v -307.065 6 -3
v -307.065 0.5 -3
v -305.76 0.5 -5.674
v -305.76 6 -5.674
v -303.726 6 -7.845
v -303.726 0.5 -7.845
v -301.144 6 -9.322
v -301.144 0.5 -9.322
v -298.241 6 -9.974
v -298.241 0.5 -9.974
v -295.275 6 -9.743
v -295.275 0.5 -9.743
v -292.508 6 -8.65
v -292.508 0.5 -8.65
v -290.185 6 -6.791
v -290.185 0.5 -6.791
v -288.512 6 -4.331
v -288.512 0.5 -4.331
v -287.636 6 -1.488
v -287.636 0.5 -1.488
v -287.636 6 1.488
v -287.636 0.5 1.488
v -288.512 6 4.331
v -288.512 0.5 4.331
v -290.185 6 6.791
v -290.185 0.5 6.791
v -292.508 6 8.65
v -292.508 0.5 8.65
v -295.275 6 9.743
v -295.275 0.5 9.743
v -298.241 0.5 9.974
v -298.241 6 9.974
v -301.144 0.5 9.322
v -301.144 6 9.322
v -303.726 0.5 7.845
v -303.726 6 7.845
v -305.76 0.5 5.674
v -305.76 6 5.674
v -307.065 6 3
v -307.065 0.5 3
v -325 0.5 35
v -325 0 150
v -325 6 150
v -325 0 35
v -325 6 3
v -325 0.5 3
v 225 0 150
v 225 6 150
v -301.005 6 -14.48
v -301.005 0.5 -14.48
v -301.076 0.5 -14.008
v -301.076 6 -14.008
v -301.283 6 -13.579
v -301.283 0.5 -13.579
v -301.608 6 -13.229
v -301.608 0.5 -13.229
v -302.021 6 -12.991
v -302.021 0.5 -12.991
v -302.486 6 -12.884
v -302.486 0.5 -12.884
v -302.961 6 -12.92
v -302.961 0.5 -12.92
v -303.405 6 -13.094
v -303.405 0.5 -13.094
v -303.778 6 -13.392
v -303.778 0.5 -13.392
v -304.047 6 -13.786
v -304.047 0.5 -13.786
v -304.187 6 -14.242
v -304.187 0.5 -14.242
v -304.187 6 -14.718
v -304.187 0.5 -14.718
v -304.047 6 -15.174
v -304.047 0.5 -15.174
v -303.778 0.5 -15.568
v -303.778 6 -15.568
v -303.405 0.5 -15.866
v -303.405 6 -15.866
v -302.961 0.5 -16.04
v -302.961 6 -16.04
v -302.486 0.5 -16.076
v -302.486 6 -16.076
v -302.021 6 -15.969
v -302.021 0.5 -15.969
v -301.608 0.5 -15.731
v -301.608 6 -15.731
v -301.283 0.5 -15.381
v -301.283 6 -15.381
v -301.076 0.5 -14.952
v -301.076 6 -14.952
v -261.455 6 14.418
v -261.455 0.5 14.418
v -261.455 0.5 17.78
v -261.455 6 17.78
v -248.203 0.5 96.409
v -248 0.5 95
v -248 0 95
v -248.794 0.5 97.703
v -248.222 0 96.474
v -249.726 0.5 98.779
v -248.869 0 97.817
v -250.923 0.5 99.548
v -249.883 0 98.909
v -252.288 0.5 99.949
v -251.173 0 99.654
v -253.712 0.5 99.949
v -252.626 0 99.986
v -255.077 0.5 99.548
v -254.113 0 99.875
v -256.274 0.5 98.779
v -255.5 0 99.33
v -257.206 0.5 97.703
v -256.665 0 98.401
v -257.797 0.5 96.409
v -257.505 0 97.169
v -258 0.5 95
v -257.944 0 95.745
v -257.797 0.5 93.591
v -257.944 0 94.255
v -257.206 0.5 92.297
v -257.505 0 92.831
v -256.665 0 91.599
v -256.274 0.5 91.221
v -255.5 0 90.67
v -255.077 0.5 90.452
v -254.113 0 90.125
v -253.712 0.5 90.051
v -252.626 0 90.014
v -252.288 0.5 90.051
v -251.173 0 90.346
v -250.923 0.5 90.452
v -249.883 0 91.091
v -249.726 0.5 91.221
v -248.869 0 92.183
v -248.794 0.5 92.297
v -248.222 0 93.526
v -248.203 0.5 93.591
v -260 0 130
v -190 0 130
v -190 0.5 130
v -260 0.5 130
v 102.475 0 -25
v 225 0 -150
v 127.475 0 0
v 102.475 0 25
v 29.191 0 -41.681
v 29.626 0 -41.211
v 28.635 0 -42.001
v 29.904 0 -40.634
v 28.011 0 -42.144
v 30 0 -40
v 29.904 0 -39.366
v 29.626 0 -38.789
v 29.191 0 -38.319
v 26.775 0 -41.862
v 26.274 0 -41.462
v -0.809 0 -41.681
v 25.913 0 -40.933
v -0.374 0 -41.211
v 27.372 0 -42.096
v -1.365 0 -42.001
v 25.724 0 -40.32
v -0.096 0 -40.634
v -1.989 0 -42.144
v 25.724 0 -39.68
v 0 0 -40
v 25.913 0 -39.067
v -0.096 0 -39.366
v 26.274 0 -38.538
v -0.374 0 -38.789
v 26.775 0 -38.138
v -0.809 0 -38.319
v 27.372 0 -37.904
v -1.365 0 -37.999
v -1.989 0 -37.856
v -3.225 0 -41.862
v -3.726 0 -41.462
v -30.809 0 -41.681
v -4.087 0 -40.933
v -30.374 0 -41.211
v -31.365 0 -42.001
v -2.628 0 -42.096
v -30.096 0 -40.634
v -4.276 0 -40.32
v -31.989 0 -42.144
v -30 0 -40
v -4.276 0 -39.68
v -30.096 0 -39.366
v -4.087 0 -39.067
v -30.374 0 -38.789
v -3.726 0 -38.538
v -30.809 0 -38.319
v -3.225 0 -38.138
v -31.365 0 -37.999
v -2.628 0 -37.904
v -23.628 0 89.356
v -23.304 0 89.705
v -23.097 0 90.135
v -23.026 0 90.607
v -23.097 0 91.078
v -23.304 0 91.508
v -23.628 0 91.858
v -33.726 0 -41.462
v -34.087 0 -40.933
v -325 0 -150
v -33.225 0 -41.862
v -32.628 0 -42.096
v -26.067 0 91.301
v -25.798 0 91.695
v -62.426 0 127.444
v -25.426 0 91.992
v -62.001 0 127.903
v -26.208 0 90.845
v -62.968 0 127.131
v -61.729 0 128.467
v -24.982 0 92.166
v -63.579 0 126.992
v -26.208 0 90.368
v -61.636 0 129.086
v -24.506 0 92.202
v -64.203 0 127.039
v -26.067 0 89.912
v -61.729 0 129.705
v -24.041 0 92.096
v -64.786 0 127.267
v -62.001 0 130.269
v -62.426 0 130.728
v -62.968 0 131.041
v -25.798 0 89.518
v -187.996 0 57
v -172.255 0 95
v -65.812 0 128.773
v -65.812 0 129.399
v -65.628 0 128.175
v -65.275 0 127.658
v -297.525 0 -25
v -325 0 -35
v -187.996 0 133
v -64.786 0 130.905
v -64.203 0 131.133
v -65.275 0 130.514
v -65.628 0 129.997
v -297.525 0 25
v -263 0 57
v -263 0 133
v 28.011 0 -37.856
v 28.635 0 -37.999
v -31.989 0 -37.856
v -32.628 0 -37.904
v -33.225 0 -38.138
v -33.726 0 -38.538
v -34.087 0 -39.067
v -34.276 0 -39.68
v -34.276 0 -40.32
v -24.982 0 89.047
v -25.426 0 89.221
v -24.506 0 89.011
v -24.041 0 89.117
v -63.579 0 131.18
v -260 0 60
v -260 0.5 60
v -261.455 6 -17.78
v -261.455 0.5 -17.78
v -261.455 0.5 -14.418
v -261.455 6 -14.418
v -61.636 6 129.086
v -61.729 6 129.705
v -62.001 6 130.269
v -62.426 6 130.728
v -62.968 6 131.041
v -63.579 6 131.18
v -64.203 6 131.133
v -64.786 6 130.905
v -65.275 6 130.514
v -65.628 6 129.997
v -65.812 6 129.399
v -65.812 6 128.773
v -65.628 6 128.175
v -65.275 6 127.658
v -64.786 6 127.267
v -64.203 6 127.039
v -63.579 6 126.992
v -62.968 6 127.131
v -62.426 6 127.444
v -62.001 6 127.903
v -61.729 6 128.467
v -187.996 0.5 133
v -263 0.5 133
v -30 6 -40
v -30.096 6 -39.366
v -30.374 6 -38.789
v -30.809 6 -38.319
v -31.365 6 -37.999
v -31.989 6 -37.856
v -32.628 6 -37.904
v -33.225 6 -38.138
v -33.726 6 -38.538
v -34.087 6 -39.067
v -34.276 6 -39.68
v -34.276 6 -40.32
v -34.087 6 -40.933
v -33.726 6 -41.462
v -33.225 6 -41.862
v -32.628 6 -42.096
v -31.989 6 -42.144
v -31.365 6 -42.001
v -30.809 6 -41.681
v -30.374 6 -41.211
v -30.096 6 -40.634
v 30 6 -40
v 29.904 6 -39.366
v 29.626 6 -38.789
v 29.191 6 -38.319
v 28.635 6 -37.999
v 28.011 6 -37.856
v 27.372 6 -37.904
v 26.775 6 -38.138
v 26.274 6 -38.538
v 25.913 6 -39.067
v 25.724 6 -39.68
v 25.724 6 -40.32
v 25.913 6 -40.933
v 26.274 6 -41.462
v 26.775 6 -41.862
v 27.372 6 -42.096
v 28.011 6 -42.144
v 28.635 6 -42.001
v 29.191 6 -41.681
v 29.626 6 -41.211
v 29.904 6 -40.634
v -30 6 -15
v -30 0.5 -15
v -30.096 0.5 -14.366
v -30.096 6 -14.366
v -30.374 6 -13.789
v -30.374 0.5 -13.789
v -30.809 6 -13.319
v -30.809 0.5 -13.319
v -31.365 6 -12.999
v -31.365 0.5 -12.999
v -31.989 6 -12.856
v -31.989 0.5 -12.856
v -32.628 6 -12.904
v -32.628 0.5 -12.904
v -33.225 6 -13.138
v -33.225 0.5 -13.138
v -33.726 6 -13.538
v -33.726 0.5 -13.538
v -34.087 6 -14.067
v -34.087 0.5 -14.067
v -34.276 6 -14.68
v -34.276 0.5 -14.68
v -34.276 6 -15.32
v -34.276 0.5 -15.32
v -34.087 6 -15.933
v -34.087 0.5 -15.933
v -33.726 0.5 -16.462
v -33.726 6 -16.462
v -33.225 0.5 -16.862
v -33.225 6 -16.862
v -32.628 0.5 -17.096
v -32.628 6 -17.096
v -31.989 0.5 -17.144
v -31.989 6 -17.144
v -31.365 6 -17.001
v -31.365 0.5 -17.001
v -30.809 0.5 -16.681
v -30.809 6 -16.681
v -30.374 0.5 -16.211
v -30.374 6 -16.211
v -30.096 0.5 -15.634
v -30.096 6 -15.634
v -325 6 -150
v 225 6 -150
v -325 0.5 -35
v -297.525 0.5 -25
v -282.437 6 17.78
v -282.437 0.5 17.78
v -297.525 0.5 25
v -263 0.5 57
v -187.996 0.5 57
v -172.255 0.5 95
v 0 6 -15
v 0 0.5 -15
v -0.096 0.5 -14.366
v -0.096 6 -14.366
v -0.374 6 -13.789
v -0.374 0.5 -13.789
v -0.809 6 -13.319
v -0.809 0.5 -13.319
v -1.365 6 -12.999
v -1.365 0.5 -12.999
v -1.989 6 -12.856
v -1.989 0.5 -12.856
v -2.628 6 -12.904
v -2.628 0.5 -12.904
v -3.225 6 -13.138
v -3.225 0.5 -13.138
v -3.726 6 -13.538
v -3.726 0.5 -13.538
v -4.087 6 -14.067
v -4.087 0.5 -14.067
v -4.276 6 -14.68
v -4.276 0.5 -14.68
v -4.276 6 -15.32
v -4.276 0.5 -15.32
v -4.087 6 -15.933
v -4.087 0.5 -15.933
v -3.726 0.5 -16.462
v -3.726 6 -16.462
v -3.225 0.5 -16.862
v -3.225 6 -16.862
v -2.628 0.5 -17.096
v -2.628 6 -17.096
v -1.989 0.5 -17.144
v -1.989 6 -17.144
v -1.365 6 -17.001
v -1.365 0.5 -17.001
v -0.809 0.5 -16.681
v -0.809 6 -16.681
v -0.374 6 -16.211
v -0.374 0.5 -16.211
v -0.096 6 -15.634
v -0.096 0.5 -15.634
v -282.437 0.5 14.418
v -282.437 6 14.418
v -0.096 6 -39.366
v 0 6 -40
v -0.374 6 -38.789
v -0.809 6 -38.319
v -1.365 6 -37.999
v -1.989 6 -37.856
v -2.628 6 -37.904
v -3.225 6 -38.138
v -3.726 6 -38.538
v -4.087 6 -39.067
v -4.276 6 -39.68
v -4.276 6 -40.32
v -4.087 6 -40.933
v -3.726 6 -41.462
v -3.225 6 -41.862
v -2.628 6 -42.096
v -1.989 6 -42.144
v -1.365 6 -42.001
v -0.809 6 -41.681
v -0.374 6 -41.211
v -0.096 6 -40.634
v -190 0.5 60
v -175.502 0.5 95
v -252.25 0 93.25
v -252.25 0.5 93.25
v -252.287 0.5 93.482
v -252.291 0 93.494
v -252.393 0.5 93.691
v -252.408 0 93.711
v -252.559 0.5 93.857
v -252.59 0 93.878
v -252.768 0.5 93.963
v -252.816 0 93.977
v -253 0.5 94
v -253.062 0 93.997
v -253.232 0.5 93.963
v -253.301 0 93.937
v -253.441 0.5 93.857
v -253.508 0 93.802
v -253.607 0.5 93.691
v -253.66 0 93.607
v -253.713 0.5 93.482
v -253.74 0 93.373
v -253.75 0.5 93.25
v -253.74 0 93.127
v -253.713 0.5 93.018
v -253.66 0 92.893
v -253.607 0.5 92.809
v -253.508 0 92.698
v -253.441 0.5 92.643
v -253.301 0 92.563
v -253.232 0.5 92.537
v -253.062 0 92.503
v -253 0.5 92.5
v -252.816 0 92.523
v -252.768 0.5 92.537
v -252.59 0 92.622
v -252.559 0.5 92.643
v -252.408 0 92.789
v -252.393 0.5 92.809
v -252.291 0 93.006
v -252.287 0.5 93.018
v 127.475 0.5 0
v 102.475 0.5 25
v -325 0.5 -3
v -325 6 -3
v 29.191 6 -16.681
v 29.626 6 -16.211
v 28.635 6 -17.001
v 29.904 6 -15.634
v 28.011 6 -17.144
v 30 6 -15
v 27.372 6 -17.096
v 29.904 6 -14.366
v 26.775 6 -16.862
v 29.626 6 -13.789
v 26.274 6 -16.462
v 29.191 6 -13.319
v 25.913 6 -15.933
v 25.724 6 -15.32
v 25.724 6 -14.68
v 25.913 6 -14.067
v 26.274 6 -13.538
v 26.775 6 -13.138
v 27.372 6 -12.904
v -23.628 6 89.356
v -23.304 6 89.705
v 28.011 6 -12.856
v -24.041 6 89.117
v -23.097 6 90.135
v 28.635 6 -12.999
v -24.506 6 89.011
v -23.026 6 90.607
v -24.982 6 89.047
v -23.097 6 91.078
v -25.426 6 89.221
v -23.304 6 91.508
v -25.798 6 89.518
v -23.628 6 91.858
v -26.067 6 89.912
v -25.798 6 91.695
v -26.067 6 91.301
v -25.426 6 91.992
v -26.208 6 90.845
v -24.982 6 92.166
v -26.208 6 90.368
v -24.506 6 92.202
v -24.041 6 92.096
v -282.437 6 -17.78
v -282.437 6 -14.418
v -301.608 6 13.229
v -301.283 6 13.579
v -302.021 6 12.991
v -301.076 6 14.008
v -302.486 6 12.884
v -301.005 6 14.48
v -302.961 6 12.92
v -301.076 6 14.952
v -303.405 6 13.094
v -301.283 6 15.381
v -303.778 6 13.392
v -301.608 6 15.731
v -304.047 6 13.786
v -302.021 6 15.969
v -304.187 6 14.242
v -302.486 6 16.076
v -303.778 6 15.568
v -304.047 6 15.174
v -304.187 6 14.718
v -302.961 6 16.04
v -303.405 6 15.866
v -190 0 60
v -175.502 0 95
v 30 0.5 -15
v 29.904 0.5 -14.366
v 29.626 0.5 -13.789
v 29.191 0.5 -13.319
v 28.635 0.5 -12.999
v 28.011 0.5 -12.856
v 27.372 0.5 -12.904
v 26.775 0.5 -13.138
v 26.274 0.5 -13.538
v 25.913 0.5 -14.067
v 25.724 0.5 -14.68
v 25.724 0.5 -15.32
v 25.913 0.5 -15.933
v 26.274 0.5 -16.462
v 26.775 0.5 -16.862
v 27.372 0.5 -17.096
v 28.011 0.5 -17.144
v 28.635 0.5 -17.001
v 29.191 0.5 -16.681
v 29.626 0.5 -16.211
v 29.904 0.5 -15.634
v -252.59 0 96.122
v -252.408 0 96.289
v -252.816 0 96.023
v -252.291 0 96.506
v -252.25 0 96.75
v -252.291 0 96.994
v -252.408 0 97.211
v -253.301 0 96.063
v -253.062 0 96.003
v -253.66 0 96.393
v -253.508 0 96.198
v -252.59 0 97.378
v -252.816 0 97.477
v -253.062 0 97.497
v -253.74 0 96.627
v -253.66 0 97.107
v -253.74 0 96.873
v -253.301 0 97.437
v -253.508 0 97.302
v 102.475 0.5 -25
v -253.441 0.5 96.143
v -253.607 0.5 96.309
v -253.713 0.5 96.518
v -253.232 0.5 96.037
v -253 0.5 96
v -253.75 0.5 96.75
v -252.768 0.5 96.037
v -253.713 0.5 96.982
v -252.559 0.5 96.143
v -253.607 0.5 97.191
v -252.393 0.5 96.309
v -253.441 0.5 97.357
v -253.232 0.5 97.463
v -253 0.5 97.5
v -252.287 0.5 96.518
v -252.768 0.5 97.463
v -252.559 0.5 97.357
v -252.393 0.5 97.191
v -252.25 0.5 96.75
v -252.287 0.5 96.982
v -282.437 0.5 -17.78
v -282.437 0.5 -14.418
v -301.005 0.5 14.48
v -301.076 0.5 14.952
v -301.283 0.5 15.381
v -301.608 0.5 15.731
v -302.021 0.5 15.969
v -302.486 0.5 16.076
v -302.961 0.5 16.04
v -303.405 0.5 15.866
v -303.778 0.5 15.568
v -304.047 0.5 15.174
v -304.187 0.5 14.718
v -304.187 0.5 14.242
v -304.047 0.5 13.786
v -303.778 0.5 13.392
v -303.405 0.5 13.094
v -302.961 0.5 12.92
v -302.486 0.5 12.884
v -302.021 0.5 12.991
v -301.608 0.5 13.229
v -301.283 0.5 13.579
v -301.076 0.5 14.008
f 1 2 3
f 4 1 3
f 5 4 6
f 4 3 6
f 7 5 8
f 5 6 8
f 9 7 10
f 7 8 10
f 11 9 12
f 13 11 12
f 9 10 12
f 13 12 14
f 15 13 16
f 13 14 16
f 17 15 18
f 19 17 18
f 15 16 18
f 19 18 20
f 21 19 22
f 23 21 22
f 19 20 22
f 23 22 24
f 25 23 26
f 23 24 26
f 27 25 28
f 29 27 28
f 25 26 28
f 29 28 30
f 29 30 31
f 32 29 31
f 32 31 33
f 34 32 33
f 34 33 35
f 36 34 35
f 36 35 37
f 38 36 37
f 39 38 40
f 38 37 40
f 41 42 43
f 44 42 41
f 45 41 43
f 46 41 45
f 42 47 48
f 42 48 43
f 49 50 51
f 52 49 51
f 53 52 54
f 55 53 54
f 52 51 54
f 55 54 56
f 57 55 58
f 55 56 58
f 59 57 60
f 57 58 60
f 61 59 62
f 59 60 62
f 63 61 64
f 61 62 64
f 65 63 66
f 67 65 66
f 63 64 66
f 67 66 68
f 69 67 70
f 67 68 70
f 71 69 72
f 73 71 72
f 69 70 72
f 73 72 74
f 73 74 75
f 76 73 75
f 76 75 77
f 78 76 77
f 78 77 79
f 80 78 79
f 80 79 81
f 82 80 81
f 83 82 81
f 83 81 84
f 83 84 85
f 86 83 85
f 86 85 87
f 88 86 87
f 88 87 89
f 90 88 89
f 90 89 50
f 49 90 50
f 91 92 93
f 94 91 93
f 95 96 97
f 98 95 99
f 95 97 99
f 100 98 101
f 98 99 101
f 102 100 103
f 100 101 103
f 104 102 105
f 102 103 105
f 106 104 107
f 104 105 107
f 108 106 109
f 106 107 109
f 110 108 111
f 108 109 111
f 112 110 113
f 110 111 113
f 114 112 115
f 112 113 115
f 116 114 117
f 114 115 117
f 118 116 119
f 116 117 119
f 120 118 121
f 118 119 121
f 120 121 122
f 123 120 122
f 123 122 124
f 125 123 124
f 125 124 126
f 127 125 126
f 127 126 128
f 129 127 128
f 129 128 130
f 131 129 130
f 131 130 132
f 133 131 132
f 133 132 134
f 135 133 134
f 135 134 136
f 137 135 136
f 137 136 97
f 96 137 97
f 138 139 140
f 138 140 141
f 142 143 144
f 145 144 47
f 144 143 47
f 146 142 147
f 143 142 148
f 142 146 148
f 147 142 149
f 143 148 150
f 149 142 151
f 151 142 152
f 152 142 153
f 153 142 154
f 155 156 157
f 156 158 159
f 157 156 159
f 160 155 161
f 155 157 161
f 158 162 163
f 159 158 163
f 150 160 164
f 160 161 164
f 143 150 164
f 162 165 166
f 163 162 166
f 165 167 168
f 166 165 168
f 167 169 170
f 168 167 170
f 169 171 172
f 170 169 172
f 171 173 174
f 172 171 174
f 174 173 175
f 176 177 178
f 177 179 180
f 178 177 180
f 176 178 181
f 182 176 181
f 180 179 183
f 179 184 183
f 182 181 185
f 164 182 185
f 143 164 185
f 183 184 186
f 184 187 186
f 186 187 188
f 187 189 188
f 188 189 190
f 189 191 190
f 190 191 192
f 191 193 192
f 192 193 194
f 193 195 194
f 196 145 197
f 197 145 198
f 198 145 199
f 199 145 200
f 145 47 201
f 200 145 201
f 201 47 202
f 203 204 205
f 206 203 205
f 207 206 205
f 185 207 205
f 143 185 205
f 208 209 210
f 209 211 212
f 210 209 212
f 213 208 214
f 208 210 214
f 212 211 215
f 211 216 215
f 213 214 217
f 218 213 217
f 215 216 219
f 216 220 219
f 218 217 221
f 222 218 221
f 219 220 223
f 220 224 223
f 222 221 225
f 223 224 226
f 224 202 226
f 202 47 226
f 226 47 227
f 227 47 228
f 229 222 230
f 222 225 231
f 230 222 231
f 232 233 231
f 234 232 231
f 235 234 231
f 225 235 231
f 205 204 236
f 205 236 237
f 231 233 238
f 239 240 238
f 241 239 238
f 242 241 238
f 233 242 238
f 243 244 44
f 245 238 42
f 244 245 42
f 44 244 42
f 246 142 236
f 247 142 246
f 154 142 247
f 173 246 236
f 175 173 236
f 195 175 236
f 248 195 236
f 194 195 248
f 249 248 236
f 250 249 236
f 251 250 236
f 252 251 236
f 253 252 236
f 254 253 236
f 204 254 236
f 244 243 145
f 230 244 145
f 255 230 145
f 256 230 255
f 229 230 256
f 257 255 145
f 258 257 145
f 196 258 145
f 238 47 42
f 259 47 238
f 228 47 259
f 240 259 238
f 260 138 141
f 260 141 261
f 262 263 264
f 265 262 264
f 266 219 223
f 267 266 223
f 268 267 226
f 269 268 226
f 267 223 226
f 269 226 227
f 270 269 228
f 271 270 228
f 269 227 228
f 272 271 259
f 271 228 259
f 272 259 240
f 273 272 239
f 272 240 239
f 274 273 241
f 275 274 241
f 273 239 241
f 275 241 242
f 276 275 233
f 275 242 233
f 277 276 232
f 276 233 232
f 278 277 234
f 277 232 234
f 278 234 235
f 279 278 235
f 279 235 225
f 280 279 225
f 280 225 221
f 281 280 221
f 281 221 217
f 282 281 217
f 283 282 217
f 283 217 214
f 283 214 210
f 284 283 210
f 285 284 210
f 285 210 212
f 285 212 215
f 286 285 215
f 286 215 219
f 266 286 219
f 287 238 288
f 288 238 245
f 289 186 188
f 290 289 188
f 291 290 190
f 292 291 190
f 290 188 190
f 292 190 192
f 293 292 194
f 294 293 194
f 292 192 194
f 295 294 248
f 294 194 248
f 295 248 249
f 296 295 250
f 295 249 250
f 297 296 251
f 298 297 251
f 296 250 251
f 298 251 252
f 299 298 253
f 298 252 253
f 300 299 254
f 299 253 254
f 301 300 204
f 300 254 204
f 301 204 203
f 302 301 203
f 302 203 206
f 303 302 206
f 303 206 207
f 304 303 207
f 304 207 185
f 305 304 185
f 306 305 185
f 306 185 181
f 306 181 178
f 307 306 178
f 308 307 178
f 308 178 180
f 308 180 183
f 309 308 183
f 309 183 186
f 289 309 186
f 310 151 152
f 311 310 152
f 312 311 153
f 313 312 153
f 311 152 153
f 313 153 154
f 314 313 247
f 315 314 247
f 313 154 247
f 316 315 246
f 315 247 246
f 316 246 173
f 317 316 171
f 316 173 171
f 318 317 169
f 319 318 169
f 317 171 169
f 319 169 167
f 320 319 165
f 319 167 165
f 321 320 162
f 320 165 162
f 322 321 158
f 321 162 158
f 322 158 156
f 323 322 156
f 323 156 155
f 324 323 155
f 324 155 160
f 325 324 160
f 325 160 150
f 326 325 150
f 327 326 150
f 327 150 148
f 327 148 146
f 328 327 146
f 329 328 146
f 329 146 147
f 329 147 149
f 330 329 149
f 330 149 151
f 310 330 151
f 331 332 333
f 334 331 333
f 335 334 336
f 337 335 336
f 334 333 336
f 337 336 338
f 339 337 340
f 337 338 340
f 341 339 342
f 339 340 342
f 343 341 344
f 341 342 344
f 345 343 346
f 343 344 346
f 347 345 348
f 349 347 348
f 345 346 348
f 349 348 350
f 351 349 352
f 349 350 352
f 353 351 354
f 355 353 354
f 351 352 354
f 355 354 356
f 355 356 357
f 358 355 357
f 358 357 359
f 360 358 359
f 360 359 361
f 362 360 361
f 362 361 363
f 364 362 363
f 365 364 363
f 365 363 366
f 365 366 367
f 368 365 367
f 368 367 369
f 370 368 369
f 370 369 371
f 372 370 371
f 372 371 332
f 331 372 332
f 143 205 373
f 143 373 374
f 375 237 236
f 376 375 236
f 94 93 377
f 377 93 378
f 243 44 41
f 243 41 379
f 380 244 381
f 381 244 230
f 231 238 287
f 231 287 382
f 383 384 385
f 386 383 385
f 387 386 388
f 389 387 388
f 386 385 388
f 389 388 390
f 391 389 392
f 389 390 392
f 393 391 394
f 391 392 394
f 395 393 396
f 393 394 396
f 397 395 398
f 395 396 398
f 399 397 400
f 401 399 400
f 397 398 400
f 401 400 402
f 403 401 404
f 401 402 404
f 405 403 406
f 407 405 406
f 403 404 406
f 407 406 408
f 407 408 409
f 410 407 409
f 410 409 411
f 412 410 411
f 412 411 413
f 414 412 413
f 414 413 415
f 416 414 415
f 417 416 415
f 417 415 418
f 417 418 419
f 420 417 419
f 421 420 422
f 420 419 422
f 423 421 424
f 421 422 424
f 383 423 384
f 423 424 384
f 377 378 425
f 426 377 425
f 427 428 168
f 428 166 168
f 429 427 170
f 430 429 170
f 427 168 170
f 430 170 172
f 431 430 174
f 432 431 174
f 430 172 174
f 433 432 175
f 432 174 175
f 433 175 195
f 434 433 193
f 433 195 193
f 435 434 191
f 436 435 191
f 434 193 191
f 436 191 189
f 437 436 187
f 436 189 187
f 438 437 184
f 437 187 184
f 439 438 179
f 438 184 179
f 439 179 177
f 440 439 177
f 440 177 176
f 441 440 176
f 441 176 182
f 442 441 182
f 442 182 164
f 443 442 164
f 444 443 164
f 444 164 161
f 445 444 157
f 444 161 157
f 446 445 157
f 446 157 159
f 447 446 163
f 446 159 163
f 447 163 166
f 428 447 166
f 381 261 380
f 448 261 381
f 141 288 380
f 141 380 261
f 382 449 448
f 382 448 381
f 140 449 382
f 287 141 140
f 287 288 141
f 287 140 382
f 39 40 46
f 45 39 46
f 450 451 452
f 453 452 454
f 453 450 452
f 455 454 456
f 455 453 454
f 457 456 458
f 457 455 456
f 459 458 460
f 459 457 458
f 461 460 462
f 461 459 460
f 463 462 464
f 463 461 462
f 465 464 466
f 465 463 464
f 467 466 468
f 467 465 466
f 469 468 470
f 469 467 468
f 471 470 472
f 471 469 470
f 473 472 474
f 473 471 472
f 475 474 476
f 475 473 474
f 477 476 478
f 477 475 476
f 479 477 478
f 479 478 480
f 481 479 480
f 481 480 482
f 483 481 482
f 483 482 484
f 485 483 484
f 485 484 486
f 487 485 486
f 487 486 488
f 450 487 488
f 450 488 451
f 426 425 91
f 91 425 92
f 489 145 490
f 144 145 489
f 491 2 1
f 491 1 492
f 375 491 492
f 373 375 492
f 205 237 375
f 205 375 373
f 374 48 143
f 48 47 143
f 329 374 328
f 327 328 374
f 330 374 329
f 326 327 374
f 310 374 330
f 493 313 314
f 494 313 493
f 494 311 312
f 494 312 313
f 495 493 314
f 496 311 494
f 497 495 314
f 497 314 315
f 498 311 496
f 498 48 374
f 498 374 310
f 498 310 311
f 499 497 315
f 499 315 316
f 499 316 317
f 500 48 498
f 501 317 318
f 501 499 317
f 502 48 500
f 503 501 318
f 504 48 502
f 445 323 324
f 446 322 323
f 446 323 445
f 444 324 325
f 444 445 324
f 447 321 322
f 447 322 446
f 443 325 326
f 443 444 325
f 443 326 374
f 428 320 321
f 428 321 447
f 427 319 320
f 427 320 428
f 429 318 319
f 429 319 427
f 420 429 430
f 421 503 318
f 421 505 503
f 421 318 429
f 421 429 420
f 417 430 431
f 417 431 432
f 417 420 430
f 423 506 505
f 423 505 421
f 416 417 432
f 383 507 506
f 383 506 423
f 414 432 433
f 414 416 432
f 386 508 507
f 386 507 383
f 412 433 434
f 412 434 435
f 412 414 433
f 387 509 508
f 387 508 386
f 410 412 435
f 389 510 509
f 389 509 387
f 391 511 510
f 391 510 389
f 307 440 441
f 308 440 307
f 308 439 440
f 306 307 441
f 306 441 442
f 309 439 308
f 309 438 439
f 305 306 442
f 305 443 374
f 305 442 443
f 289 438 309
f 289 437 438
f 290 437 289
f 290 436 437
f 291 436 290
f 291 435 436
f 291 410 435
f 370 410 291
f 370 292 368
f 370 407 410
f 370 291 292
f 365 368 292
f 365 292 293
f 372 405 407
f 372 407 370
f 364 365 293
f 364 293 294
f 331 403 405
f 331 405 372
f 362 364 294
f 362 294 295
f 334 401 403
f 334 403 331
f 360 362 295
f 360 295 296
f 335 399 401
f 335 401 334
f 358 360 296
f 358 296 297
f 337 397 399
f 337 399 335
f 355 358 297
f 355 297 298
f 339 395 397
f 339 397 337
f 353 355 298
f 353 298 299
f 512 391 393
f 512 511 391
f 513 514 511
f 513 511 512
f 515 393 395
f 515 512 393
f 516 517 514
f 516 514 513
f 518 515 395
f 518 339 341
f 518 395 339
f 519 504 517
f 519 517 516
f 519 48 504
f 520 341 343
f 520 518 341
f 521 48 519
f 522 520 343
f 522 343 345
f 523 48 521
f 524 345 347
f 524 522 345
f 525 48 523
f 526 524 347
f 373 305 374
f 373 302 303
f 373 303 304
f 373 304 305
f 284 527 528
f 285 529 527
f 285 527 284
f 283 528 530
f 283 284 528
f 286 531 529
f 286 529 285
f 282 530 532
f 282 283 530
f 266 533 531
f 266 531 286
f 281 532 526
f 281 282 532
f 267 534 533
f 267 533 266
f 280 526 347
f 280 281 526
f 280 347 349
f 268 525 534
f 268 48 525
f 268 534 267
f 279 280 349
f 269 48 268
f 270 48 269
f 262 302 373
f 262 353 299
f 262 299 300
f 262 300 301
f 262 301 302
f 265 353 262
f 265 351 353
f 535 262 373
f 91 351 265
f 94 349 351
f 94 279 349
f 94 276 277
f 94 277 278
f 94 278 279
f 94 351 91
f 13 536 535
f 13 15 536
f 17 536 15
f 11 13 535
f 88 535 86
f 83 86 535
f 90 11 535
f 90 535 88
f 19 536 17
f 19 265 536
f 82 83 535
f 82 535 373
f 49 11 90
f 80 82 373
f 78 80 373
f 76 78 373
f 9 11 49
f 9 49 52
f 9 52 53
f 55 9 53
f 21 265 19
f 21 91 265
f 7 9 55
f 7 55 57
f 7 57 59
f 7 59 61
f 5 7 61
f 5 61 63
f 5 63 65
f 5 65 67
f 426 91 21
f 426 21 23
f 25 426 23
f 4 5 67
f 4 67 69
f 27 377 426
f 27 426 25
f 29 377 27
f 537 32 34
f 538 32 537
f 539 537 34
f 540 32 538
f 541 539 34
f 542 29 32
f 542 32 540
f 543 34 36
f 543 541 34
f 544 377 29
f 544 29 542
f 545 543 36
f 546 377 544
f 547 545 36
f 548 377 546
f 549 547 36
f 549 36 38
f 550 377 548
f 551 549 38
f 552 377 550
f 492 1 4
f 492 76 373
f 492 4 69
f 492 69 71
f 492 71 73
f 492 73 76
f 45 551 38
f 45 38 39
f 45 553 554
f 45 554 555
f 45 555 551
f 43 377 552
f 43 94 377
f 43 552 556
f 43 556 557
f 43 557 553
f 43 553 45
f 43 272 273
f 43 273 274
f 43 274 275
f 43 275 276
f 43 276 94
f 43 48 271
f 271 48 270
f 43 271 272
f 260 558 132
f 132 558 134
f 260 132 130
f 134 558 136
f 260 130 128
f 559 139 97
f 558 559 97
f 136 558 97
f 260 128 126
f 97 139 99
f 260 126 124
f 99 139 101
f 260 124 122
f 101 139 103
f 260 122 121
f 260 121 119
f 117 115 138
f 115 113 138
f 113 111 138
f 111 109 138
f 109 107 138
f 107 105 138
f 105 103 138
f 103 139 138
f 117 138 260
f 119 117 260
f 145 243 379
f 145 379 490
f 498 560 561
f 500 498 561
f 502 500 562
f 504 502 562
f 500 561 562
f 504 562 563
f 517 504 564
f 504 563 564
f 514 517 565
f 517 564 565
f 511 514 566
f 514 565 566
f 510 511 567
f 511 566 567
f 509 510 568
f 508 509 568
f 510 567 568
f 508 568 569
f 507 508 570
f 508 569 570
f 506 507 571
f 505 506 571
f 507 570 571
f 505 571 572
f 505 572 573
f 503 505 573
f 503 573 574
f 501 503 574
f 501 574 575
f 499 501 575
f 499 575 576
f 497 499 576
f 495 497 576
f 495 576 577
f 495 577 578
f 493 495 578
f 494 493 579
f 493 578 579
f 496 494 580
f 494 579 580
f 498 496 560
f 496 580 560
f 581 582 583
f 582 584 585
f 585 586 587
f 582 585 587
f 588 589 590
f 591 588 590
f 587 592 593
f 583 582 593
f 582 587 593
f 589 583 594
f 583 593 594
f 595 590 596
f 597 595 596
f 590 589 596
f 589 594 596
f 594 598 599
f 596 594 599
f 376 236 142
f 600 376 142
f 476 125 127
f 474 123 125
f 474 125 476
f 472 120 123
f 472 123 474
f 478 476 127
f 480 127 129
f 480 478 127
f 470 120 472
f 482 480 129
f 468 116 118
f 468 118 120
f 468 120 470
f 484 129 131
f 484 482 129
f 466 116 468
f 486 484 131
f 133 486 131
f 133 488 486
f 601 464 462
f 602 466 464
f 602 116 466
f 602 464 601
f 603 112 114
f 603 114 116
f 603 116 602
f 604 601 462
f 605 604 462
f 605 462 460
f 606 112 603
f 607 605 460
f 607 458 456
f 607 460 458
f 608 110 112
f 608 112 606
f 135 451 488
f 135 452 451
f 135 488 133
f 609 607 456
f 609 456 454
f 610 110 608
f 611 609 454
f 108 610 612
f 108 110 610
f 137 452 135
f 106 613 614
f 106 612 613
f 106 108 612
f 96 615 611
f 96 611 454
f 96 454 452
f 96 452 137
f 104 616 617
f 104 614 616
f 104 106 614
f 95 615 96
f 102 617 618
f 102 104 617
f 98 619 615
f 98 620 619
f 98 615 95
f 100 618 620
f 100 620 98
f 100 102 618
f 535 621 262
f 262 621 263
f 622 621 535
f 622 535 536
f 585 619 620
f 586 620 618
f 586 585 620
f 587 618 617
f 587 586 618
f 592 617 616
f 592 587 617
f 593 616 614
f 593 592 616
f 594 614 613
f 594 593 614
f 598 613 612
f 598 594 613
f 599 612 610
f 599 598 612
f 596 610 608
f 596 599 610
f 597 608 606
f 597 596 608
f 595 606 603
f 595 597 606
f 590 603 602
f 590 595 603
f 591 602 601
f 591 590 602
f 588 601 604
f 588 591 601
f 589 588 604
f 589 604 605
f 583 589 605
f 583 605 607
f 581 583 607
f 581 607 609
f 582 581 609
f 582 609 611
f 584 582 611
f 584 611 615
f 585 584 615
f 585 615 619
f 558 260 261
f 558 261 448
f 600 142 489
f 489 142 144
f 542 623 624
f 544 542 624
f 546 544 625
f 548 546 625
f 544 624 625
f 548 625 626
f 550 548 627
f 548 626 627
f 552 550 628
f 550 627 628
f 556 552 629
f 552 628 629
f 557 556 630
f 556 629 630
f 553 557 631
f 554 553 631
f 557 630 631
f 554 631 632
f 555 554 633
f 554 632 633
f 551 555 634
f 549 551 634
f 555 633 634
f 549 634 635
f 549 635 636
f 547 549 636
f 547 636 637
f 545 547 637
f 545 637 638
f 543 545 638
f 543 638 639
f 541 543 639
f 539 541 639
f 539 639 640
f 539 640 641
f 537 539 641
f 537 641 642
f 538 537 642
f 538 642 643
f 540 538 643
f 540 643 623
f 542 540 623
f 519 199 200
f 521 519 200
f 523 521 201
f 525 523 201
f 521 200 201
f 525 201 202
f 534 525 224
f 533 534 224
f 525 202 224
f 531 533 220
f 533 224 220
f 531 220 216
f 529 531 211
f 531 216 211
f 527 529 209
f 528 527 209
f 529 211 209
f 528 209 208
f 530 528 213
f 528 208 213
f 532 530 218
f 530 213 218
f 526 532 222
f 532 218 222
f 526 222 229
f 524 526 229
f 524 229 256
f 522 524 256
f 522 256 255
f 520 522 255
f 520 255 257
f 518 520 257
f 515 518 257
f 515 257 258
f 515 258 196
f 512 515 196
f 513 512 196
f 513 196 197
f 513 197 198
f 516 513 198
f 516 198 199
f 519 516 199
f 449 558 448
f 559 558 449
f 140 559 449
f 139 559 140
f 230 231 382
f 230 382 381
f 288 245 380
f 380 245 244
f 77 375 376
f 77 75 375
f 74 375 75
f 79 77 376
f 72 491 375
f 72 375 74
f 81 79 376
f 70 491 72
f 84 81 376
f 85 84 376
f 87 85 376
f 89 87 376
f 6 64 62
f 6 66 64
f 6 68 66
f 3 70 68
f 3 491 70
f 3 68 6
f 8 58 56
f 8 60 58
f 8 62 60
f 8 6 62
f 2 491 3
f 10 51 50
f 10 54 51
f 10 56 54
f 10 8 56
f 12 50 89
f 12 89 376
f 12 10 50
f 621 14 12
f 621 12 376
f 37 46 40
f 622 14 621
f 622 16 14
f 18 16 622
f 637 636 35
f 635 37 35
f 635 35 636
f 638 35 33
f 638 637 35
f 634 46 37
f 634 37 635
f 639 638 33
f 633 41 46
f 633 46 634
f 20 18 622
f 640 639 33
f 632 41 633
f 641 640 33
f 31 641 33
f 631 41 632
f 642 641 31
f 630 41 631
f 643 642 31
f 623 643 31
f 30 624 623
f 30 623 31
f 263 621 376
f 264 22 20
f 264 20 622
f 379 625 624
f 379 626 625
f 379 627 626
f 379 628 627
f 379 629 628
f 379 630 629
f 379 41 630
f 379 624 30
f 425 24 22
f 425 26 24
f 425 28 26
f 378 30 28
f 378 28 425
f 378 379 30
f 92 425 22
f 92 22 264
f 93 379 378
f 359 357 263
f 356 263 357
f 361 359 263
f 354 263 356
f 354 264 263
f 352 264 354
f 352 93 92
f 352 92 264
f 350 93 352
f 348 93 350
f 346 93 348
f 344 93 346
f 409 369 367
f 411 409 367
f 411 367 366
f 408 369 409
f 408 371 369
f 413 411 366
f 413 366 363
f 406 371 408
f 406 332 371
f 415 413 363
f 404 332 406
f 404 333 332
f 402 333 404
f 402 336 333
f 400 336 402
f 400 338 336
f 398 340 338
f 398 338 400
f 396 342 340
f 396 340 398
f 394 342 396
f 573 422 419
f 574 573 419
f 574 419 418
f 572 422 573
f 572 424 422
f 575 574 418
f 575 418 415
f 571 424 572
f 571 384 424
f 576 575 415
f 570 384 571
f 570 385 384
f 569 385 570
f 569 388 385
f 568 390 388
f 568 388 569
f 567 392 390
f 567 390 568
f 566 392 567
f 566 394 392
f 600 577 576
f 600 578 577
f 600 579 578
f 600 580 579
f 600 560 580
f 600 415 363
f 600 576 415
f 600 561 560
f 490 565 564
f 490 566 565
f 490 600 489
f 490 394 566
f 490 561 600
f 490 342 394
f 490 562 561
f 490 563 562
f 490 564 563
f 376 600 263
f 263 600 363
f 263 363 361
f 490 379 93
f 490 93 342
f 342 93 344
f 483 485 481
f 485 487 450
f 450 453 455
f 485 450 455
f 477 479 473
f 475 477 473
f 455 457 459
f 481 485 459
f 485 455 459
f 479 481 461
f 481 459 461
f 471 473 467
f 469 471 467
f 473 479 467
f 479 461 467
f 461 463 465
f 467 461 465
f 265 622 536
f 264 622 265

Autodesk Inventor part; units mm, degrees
ref_plane "YZ Plane" through (0, 0, 0) normal (1, 0, 0) x (0, 1, 0)
ref_plane "XZ Plane" through (0, 0, 0) normal (0, 1, 0) x (-1, 0, 0)
ref_plane "XY Plane" through (0, 0, 0) normal (0, 0, 1) x (1, 0, 0)
sketch "Эскиз1" plane through (0, 0, 0) normal (0, 1, 0) x (-1, 0, 0)
  ellipse E0 centre (50, 0) end of major axis (50, -150) minor radius 275
  line L0 (50, 150) -> (-225, 150)
  line L1 (-225, 150) -> (-225, -150)
  line L2 (-225, -150) -> (50, -150)
  line L3 (50, -150) -> (50, 150)
  line L4 (50, 150) -> (325, 150)
  line L5 (325, 150) -> (325, -150)
  line L6 (325, -150) -> (50, -150)
  line L7 (50, -150) -> (50, 150)
  point P0 (0, 0)
  point P1 (50, -150)
  point P2 (50, 0)
  dimension "d0" = 275
  dimension "d1" = 150
  dimension "d40" = 325
extrude "Выдавливание1" add sketch "Эскиз1" along normal blind 6
sketch "Эскиз2" plane through (0, 0, 0) normal (0, -1, 0) x (1, 0, 0)
  line L0 (-260, 60) -> (-190, 60)
  line L1 (-190, 60) -> (-190, 130)
  line L2 (-190, 130) -> (-260, 130)
  line L3 (-260, 130) -> (-260, 60)
  line L4 (-190, 60) -> (-175.5025, 95)
  line L5 (-175.5025, 95) -> (-190, 130)
  line L6 (-325, 150) -> (225, 150) projected
  line L7 (-325, 150) -> (225, 150) projected
  line L8 (-250, 190) -> (-331.0569, 190) construction
  line L9 (-175.5025, 51.7755) -> (-260, 130) construction
  line L10 (-260, 60) -> (-175.5025, 138.2245) construction
  circle A0 centre (-222.1933, 95) radius 14.4069 construction
  line L11 (-187.9955, 133) -> (-263, 133)
  line L12 (-263, 133) -> (-263, 57)
  line L13 (-263, 57) -> (-187.9955, 57)
  line L14 (-187.9955, 133) -> (-172.2553, 95)
  line L15 (-172.2553, 95) -> (-187.9955, 57)
  line L16 (-260, 95) -> (-253, 95)
  circle A1 centre (-253, 95) radius 5
  circle A2 centre (-253, 96.75) radius 0.75
  circle A3 centre (-253, 93.25) radius 0.75
  line L17 (-253, 93.25) -> (-253, 96.75)
  line L18 (-325, -150) -> (-325, 150) projected
  line L19 (-325, -150) -> (-325, 150) projected
  line L20 (-325, 35) -> (-297.5252, 25)
  line L21 (-297.5252, 25) -> (102.4748, 25)
  line L22 (102.4748, 25) -> (127.4748, 0)
  line L23 (225, 150) -> (225, -150) projected
  line L24 (225, 0) -> (-325, 0) construction
  line L25 (-325, -35) -> (-297.5252, -25)
  line L26 (-297.5252, -25) -> (102.4748, -25)
  line L27 (102.4748, -25) -> (127.4748, 0)
  point P0 (-325, -115)
  point P1 (-325, 115)
  point P2 (-331.0569, 190)
  dimension "d12" = 135
  dimension "d13" = 70
  dimension "d16" = 3
  dimension "d17" = 3
  dimension "d20" = 7
  dimension "d21" = 10
  dimension "d35" = 55
  dimension "d37" = 1.75
  dimension "d38" = 1.5
  dimension "d57" = 62
  dimension "d59" = 70
  dimension "d60" = 135
  dimension "d62" = 400
  dimension "d63" = 35
  dimension "d64" = 25
  dimension "d65" = 32
extrude "Выдавливание2" cut sketch "Эскиз2" against normal blind 0.5
sketch "Эскиз3" plane through (0, 0, 0) normal (0, -1, 0) x (1, 0, 0)
  circle A0 centre (-297.5252, 0) radius 10
  line L0 (-295, -14.0809) -> (-297.5252, 0) construction
  circle A1 centre (-302.6052, -14.48) radius 1.6
  line L1 (-325, -35) -> (-325, 35) projected
  line L2 (-325, 0) -> (327.0887, 0) construction
  line L3 (-305.9052, -17.78) -> (-261.4552, -17.78)
  line L4 (-261.4552, -17.78) -> (-261.4552, 17.78)
  line L5 (-261.4552, 17.78) -> (-305.9052, 17.78)
  line L6 (-305.9052, 17.78) -> (-305.9052, -17.78)
  line L7 (-261.4552, -17.78) -> (-285.6608, 0) construction
  line L8 (-261.4552, 17.78) -> (-285.6608, 0) construction
  line L9 (-261.4552, 17.78) -> (-282.4372, 17.78)
  line L10 (-282.4372, 17.78) -> (-282.4372, 14.418)
  line L11 (-282.4372, 14.418) -> (-261.4552, 14.418)
  line L12 (-261.4552, 14.418) -> (-261.4552, 17.78)
  line L13 (-282.4372, -17.78) -> (-282.4372, -14.418)
  line L14 (-282.4372, -14.418) -> (-261.4552, -14.418)
  circle A2 centre (-302.6052, 14.48) radius 1.6
  line L15 (-297.5252, -25) -> (-325, -35) projected
  line L16 (102.4748, -25) -> (-297.5252, -25) projected
  line L17 (-325, 35) -> (-297.5252, 25) projected
  line L18 (-297.5252, 25) -> (102.4748, 25) projected
  line L19 (-297.5252, 25) -> (102.4748, 25) projected
  line L20 (-297.5252, -25) -> (-297.5252, 25) construction
  line L21 (-307.0646, 3) -> (-325, 3)
  line L22 (-307.0646, -3) -> (-325, -3)
  point P0 (0, 0)
  point P1 (-325, 25)
  point P2 (-305.9052, 5.4567)
  point P3 (-305.9052, -5.4567)
  point P4 (-282.4372, 17.78)
  dimension "d22" = 20
  dimension "d23" = 5.08
  dimension "d25" = 14.48
  dimension "d26" = 3.2
  dimension "d28" = 44.45
  dimension "d29" = 35.56
  dimension "d30" = 8.38
  dimension "d31" = 3.362
  dimension "d32" = 20.982
  dimension "d67" = 3
extrude "Выдавливание3" cut sketch "Эскиз3" against normal blind 14.48 contours A0 L6 | A0 L22 L1 L21 | A0 L6 | L5 L4 L11 L10 | L13 L14 L4 L3 | A1 | A2
sketch "Эскиз4" plane through (0, 0, 0) normal (0, -1, 0) x (1, 0, 0)
  line L0 (0, 0) -> (-4.3, 0) construction
  line L1 (-4.3, 0) -> (-4.3, -50) construction
  line L2 (-4.3, -50) -> (0, -50) construction
  line L3 (0, -50) -> (0, 0) construction
  circle A0 centre (-2.15, -15) radius 2.15
  circle A1 centre (-2.15, -40) radius 2.15
  line L4 (-30, 0) -> (-34.3, 0) construction
  line L5 (-34.3, 0) -> (-34.3, -50) construction
  line L6 (-34.3, -50) -> (-30, -50) construction
  line L7 (-30, -50) -> (-30, 0) construction
  circle A2 centre (-32.15, -15) radius 2.15
  circle A3 centre (-32.15, -40) radius 2.15
  line L8 (30, 0) -> (25.7, 0) construction
  line L9 (25.7, 0) -> (25.7, -50) construction
  line L10 (25.7, -50) -> (30, -50) construction
  line L11 (30, -50) -> (30, 0) construction
  circle A4 centre (27.85, -15) radius 2.15
  circle A5 centre (27.85, -40) radius 2.15
  line L12 (0, 0) -> (-4.3, 0) construction
  line L13 (-4.3, 0) -> (-4.3, -50) construction
  line L14 (-4.3, -50) -> (0, -50) construction
  line L15 (0, -50) -> (0, 0) construction
  circle A6 centre (-2.15, -15) radius 2.15
  circle A7 centre (-2.15, -40) radius 2.15
  circle A8 centre (-63.7357, 129.0861) radius 2.1
  circle A9 centre (-24.6255, 90.6066) radius 1.6
  dimension "d41" = 4.3
  dimension "d42" = 50
  dimension "d43" = 10
  dimension "d44" = 15
  dimension "d47" = 30
  dimension "d50" = 30
  dimension "d53" = 4.2
  dimension "d54" = 3.2
extrude "Выдавливание4" cut sketch "Эскиз4" against normal blind 10
equation "\"d33\" = d25"
properties part number "щиток"
